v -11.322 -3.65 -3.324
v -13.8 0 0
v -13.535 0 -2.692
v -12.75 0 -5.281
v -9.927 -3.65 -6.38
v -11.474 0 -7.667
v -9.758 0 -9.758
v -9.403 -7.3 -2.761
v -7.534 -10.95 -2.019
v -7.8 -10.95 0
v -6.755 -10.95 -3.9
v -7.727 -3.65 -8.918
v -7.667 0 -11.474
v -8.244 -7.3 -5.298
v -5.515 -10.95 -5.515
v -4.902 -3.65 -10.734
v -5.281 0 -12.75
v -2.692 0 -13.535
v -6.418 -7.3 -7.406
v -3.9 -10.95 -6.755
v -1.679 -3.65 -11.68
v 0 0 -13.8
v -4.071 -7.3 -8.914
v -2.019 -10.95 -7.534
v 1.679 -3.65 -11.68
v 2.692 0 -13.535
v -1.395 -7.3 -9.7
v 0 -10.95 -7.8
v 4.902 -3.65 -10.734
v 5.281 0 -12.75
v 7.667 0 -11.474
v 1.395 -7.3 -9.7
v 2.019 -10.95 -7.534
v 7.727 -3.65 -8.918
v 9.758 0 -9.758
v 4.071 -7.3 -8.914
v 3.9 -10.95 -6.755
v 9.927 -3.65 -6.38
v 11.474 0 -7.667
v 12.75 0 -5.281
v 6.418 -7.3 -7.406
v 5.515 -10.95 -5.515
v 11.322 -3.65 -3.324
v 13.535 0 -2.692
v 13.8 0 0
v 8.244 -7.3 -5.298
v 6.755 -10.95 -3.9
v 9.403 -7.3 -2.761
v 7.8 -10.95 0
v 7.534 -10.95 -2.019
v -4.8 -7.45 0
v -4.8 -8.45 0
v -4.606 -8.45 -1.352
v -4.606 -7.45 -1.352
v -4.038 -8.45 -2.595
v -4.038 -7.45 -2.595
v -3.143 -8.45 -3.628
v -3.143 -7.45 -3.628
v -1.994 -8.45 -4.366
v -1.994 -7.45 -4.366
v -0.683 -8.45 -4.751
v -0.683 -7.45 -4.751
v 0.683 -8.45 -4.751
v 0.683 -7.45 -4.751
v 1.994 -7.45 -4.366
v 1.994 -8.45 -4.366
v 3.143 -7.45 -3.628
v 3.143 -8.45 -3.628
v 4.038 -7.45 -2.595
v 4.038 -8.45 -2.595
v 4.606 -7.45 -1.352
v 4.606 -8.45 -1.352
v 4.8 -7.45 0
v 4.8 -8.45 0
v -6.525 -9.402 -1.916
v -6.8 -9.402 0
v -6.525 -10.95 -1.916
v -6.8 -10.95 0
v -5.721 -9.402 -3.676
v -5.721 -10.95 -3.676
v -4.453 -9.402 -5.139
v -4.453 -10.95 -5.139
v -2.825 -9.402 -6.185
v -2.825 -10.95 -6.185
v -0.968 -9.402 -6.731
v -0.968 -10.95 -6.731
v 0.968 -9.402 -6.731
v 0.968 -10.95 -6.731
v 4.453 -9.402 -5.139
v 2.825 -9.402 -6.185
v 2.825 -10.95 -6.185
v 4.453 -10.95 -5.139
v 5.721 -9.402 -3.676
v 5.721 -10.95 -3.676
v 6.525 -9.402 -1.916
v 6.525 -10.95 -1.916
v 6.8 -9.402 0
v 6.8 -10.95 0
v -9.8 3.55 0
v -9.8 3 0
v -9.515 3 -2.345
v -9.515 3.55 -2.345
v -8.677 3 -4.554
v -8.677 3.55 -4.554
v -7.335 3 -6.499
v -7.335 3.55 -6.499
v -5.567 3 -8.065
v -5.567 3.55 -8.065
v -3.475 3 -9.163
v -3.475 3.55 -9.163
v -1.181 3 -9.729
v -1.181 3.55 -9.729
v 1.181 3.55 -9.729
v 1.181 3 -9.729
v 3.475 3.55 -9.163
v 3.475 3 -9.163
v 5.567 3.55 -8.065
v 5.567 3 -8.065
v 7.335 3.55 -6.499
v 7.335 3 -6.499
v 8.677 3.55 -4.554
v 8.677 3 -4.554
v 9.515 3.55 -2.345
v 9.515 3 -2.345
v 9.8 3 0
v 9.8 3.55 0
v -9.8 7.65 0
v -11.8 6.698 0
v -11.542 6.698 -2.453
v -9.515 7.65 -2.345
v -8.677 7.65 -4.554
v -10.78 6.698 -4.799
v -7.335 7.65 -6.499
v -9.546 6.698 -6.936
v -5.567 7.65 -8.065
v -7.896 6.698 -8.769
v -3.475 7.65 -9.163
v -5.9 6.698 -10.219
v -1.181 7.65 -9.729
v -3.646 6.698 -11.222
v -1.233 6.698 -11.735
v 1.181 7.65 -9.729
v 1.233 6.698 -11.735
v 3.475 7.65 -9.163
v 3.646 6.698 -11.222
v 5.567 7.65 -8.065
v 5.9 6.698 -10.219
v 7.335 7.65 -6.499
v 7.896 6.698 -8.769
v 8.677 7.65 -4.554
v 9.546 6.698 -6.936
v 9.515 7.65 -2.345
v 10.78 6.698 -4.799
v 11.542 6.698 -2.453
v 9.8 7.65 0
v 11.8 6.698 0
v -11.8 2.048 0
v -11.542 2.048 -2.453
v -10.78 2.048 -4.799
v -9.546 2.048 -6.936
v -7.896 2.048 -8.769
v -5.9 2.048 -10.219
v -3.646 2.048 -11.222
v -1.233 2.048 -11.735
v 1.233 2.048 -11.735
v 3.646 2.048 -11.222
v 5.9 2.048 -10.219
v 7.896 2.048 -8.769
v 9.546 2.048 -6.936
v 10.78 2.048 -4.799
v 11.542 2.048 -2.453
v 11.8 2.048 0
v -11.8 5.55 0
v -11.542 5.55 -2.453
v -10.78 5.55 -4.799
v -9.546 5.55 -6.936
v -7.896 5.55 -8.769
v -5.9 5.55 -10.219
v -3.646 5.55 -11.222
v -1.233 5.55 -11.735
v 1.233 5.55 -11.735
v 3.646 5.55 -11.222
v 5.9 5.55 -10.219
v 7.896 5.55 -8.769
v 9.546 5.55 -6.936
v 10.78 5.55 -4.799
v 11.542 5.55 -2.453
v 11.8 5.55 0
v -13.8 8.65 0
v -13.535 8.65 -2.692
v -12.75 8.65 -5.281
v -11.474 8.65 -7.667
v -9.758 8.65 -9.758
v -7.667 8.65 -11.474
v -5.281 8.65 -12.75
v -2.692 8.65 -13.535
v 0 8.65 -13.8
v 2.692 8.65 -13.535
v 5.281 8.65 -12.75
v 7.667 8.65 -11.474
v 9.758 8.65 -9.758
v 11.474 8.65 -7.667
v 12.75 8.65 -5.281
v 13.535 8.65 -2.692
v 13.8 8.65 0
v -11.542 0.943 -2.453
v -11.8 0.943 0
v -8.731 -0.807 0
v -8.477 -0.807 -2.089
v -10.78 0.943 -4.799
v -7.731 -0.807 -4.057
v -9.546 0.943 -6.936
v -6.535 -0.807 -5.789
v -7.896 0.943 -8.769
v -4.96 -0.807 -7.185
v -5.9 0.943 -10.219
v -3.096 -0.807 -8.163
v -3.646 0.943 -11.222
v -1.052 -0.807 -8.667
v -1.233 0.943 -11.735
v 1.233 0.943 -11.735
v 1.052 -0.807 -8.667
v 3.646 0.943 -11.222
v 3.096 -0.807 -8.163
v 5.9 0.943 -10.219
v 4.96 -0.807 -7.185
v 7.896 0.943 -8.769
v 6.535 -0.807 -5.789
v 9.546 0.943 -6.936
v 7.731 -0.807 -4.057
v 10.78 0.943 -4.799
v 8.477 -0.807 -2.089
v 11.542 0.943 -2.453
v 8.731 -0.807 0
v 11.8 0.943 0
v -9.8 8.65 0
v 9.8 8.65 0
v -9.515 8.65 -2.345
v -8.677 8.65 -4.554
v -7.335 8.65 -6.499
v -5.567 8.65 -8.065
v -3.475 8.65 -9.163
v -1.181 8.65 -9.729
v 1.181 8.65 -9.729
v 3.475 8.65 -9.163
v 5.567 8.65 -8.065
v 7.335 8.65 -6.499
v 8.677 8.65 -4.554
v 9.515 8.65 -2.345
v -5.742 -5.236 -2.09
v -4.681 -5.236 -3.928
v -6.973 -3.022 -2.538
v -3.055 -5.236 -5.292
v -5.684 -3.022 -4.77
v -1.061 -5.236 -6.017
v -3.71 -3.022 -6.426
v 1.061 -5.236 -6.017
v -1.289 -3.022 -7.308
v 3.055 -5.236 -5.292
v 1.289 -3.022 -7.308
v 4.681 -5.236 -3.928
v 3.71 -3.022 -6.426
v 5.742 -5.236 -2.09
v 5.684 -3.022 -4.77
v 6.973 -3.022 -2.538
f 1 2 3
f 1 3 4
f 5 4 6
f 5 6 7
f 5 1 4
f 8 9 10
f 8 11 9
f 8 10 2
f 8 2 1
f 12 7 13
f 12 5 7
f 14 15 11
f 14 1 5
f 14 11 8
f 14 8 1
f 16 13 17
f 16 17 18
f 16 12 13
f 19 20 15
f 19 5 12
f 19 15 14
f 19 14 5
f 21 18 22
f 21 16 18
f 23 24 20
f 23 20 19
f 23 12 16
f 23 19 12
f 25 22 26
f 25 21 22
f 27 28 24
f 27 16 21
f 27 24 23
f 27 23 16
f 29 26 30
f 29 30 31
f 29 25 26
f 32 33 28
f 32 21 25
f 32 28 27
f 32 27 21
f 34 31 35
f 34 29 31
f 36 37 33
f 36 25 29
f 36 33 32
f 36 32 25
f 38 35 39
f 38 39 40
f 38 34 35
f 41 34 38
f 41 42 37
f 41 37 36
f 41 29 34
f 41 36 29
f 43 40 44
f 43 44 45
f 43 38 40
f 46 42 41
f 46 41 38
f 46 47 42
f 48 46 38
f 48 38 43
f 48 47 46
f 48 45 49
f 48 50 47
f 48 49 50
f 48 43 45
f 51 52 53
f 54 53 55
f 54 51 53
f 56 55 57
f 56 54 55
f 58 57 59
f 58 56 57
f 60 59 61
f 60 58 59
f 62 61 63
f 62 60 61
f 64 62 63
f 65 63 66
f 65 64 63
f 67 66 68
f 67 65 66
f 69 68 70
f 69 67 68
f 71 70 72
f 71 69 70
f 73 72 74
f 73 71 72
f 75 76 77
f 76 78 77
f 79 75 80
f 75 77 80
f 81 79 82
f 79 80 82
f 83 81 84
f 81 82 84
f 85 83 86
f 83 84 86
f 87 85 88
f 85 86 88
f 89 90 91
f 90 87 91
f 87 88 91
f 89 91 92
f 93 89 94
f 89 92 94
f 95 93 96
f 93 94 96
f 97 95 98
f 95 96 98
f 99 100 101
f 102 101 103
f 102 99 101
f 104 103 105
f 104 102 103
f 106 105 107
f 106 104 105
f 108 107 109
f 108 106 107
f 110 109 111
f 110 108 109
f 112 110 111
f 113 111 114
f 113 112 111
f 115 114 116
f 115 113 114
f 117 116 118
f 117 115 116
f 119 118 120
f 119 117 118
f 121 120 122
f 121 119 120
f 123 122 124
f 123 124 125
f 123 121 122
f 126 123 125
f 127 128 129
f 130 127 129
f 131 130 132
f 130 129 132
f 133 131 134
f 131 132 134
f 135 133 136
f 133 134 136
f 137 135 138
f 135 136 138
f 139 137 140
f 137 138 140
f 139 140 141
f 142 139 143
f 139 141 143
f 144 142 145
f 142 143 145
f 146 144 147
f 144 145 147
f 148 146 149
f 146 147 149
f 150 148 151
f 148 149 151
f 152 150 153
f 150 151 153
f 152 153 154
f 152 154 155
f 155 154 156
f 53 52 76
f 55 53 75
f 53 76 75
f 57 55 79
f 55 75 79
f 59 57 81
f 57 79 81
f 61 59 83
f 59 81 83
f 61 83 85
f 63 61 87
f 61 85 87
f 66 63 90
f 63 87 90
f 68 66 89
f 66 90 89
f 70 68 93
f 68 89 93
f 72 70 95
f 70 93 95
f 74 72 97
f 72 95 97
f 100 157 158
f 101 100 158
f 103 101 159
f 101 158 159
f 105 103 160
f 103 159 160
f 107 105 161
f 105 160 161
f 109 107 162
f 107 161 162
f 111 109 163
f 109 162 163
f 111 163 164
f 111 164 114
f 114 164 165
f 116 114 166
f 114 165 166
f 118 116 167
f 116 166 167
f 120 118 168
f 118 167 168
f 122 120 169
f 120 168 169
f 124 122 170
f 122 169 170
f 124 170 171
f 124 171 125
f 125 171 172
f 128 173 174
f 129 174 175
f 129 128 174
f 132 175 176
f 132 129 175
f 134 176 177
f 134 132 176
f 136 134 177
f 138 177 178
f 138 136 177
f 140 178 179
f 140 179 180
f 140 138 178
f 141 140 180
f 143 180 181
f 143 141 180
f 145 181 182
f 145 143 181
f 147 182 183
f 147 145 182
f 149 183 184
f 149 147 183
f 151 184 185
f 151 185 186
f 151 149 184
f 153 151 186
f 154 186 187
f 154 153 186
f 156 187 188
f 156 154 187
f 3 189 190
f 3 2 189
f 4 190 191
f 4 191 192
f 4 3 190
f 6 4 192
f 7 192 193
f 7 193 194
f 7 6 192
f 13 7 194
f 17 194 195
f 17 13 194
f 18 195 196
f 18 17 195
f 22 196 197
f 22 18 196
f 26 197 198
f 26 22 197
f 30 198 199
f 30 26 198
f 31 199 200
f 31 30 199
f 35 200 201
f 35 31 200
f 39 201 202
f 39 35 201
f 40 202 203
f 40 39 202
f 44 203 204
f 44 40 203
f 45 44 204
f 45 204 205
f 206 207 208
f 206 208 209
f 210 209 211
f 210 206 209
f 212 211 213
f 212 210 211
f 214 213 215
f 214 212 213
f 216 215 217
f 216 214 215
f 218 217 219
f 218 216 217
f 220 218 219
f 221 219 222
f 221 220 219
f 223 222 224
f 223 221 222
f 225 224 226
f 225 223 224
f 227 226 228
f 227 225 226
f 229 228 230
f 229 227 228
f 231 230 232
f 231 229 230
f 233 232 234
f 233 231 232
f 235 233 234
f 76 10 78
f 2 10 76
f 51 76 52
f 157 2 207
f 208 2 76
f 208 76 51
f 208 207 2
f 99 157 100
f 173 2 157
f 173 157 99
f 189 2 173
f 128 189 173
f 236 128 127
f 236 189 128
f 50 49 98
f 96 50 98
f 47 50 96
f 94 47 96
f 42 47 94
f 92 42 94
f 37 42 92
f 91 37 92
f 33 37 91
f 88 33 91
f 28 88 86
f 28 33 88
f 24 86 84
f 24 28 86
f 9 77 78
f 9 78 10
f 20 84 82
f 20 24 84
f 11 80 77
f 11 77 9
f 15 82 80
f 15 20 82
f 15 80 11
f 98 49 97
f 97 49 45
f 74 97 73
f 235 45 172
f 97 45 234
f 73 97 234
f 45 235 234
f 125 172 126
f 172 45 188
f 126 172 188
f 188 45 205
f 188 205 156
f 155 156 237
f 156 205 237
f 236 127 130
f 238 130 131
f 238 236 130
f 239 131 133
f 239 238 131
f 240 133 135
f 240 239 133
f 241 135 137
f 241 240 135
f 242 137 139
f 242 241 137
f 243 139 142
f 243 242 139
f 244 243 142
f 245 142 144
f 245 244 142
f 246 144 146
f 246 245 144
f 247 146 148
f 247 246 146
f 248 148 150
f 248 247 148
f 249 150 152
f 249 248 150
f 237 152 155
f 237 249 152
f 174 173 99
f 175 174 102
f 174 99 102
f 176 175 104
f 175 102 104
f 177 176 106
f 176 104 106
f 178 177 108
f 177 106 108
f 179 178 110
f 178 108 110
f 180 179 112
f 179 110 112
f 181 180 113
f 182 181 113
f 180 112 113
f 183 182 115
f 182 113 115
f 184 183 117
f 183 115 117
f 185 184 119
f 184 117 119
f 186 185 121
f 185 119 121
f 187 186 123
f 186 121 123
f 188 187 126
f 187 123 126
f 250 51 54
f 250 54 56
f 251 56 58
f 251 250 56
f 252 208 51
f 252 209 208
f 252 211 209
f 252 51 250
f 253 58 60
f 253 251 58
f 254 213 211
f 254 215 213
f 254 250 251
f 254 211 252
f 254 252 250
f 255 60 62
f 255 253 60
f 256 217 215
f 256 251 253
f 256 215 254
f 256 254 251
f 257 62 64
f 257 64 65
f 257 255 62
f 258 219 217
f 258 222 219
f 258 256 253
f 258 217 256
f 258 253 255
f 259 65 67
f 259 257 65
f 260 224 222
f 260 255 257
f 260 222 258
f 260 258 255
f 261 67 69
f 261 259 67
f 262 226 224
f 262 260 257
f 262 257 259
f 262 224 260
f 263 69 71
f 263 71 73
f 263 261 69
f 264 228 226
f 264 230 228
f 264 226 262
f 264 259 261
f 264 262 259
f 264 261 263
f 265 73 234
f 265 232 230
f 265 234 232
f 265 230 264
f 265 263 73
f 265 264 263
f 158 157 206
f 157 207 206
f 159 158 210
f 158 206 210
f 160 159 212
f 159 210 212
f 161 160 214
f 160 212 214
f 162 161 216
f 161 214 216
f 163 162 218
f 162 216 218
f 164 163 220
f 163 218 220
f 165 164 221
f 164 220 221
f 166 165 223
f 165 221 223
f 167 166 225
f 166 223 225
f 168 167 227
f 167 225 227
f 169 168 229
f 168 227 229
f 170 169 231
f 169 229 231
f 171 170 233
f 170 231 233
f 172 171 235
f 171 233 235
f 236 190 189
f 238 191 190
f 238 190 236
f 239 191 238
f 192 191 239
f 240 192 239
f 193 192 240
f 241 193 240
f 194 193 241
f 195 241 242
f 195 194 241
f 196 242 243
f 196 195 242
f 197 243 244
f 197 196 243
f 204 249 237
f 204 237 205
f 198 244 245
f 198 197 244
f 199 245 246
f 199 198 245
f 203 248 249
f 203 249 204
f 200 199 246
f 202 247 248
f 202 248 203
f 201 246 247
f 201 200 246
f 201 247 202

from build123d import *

# Parameters (mm, degrees)
F1_ANGLE    = 180
F2_T4_ANGLE = 243.6352501502
F2_S5_R     = 11.8
F2_T6_DEPTH = 16
F3_T4_ANGLE = 243.2500896942
F3_S5_R     = 11.8
F3_T6_DEPTH = 16
F4_T4_ANGLE = 243.7164036037
F4_S5_R     = 11.8
F4_T6_DEPTH = 16
F5_T4_ANGLE = 243.7164036037
F5_S5_R     = 11.8
F5_T6_DEPTH = 16
F6_T4_ANGLE = 310.0876573575
F6_S5_R     = 6.8
F6_T6_DEPTH = 11


# Not quite as in the source:
# - a fillet or chamfer that OpenCascade refuses, or shapes differently, is made with other operations: its cross-section is extruded or revolved along the edge and cut away or added


with BuildPart() as f1:
    # F0 (on Top) → F1 (revolve)
    with BuildSketch(Plane.XY):
        Polygon((-11.8, 5.65), (-11.8, 6.65), (-13.8, 6.65), (-13.8, 0), (-7.8, -10.95), (-6.8, -10.95), (-6.8, -9.45), (-4.8, -9.45), (-4.8, -7.45), (-9.8, 1), (-11.8, 1), (-11.8, 2), (-9.8, 2), (-9.8, 5.65), align=None)
        Polygon((-13.8, 6.65), (-11.8, 6.65), (-9.8, 6.65), (-9.8, 8.65), (-13.8, 8.65), align=None)
    revolve(axis=Axis((0, 0, 0), (0, -1, 0)), revolution_arc=F1_ANGLE)

    # F2: chamfer of 2.1 on 1 edges, made by hand


with BuildPart() as f2_tool2:
    # F2_s3 → F2_t4 (revolve)
    with BuildSketch(Plane(origin=(0, 0, 0), x_dir=(0, 1, 0), z_dir=(0.5272172108, 0, 0.849730553))):
        Polygon((-0.8073066866, 8.7305877594), (1, 11.9), (1, 9.8), align=None)
    revolve(axis=Axis((0, 1, 0), (0, -1, 0)), revolution_arc=F2_T4_ANGLE)

    # F2_s5 → F2_t6 (intersect, symmetric)
    with BuildSketch(Plane.XZ.offset(-0.1)):
        Circle(F2_S5_R)
    extrude(amount=F2_T6_DEPTH, both=True, mode=Mode.INTERSECT)


with BuildPart() as f1_1:
    add(f1.part)

    # F2_t1: cut F2_tool2
    add(f2_tool2.part, mode=Mode.SUBTRACT)

    # F3: chamfer of 2.1 on 1 edges, made by hand


with BuildPart() as f3_tool2:
    # F3_s3 → F3_t4 (revolve)
    with BuildSketch(Plane(origin=(0, 0, 0), x_dir=(0, 1, 0), z_dir=(0.5243581586, 0, 0.8514978107))):
        Polygon((5.65, 11.9), (3.55, 9.8), (5.65, 9.8), align=None)
    revolve(axis=Axis((0, 5.65, 0), (0, -1, 0)), revolution_arc=F3_T4_ANGLE)

    # F3_s5 → F3_t6 (intersect, symmetric)
    with BuildSketch(Plane.XZ.offset(-4.6)):
        Circle(F3_S5_R)
    extrude(amount=F3_T6_DEPTH, both=True, mode=Mode.INTERSECT)


with BuildPart() as f1_2:
    add(f1_1.part)

    # F3_t1: cut F3_tool2
    add(f3_tool2.part, mode=Mode.SUBTRACT)

    # F4: chamfer of 2.1 x 1 on 1 edges, made by hand


with BuildPart() as f4_tool2:
    # F4_s3 → F4_t4 (revolve)
    with BuildSketch(Plane(origin=(0, 0, 0), x_dir=(0, 1, 0), z_dir=(0.5278188556, 0, 0.849356966))):
        Polygon((7.65, 9.8), (6.65, 11.9), (6.65, 9.8), align=None)
    revolve(axis=Axis((0, 6.65, 0), (0, -1, 0)), revolution_arc=F4_T4_ANGLE)

    # F4_s5 → F4_t6 (intersect, symmetric)
    with BuildSketch(Plane.XZ.offset(-7.2)):
        Circle(F4_S5_R)
    extrude(amount=F4_T6_DEPTH, both=True, mode=Mode.INTERSECT)


with BuildPart() as f1_3:
    add(f1_2.part)

    # F4_t1: cut F4_tool2
    add(f4_tool2.part, mode=Mode.SUBTRACT)

    # F5: chamfer of 2.1 x 1 on 1 edges, made by hand


with BuildPart() as f5_tool2:
    # F5_s3 → F5_t4 (revolve)
    with BuildSketch(Plane(origin=(0, 0, 0), x_dir=(0, 1, 0), z_dir=(0.5278188556, 0, 0.849356966))):
        Polygon((3, 9.8), (2, 11.9), (2, 9.8), align=None)
    revolve(axis=Axis((0, 2, 0), (0, -1, 0)), revolution_arc=F5_T4_ANGLE)

    # F5_s5 → F5_t6 (intersect, symmetric)
    with BuildSketch(Plane.XZ.offset(-2.5)):
        Circle(F5_S5_R)
    extrude(amount=F5_T6_DEPTH, both=True, mode=Mode.INTERSECT)


with BuildPart() as f1_4:
    add(f1_3.part)

    # F5_t1: cut F5_tool2
    add(f5_tool2.part, mode=Mode.SUBTRACT)

    # F6: chamfer of 2.1 x 1 on 1 edges, made by hand


with BuildPart() as f6_tool2:
    # F6_s3 → F6_t4 (revolve)
    with BuildSketch(Plane(origin=(0, 0, 0), x_dir=(0, 1, 0), z_dir=(0.9066308057, 0, 0.4219248537))):
        Polygon((-8.45, 4.8), (-9.45, 6.9), (-9.45, 4.8), align=None)
    revolve(axis=Axis((0, -9.45, 0), (0, -1, 0)), revolution_arc=F6_T4_ANGLE)

    # F6_s5 → F6_t6 (intersect, symmetric)
    with BuildSketch(Plane.XZ.offset(8.9)):
        Circle(F6_S5_R)
    extrude(amount=F6_T6_DEPTH, both=True, mode=Mode.INTERSECT)


with BuildPart() as f1_5:
    add(f1_4.part)

    # F6_t1: cut F6_tool2
    add(f6_tool2.part, mode=Mode.SUBTRACT)


solid = f1_5.part
